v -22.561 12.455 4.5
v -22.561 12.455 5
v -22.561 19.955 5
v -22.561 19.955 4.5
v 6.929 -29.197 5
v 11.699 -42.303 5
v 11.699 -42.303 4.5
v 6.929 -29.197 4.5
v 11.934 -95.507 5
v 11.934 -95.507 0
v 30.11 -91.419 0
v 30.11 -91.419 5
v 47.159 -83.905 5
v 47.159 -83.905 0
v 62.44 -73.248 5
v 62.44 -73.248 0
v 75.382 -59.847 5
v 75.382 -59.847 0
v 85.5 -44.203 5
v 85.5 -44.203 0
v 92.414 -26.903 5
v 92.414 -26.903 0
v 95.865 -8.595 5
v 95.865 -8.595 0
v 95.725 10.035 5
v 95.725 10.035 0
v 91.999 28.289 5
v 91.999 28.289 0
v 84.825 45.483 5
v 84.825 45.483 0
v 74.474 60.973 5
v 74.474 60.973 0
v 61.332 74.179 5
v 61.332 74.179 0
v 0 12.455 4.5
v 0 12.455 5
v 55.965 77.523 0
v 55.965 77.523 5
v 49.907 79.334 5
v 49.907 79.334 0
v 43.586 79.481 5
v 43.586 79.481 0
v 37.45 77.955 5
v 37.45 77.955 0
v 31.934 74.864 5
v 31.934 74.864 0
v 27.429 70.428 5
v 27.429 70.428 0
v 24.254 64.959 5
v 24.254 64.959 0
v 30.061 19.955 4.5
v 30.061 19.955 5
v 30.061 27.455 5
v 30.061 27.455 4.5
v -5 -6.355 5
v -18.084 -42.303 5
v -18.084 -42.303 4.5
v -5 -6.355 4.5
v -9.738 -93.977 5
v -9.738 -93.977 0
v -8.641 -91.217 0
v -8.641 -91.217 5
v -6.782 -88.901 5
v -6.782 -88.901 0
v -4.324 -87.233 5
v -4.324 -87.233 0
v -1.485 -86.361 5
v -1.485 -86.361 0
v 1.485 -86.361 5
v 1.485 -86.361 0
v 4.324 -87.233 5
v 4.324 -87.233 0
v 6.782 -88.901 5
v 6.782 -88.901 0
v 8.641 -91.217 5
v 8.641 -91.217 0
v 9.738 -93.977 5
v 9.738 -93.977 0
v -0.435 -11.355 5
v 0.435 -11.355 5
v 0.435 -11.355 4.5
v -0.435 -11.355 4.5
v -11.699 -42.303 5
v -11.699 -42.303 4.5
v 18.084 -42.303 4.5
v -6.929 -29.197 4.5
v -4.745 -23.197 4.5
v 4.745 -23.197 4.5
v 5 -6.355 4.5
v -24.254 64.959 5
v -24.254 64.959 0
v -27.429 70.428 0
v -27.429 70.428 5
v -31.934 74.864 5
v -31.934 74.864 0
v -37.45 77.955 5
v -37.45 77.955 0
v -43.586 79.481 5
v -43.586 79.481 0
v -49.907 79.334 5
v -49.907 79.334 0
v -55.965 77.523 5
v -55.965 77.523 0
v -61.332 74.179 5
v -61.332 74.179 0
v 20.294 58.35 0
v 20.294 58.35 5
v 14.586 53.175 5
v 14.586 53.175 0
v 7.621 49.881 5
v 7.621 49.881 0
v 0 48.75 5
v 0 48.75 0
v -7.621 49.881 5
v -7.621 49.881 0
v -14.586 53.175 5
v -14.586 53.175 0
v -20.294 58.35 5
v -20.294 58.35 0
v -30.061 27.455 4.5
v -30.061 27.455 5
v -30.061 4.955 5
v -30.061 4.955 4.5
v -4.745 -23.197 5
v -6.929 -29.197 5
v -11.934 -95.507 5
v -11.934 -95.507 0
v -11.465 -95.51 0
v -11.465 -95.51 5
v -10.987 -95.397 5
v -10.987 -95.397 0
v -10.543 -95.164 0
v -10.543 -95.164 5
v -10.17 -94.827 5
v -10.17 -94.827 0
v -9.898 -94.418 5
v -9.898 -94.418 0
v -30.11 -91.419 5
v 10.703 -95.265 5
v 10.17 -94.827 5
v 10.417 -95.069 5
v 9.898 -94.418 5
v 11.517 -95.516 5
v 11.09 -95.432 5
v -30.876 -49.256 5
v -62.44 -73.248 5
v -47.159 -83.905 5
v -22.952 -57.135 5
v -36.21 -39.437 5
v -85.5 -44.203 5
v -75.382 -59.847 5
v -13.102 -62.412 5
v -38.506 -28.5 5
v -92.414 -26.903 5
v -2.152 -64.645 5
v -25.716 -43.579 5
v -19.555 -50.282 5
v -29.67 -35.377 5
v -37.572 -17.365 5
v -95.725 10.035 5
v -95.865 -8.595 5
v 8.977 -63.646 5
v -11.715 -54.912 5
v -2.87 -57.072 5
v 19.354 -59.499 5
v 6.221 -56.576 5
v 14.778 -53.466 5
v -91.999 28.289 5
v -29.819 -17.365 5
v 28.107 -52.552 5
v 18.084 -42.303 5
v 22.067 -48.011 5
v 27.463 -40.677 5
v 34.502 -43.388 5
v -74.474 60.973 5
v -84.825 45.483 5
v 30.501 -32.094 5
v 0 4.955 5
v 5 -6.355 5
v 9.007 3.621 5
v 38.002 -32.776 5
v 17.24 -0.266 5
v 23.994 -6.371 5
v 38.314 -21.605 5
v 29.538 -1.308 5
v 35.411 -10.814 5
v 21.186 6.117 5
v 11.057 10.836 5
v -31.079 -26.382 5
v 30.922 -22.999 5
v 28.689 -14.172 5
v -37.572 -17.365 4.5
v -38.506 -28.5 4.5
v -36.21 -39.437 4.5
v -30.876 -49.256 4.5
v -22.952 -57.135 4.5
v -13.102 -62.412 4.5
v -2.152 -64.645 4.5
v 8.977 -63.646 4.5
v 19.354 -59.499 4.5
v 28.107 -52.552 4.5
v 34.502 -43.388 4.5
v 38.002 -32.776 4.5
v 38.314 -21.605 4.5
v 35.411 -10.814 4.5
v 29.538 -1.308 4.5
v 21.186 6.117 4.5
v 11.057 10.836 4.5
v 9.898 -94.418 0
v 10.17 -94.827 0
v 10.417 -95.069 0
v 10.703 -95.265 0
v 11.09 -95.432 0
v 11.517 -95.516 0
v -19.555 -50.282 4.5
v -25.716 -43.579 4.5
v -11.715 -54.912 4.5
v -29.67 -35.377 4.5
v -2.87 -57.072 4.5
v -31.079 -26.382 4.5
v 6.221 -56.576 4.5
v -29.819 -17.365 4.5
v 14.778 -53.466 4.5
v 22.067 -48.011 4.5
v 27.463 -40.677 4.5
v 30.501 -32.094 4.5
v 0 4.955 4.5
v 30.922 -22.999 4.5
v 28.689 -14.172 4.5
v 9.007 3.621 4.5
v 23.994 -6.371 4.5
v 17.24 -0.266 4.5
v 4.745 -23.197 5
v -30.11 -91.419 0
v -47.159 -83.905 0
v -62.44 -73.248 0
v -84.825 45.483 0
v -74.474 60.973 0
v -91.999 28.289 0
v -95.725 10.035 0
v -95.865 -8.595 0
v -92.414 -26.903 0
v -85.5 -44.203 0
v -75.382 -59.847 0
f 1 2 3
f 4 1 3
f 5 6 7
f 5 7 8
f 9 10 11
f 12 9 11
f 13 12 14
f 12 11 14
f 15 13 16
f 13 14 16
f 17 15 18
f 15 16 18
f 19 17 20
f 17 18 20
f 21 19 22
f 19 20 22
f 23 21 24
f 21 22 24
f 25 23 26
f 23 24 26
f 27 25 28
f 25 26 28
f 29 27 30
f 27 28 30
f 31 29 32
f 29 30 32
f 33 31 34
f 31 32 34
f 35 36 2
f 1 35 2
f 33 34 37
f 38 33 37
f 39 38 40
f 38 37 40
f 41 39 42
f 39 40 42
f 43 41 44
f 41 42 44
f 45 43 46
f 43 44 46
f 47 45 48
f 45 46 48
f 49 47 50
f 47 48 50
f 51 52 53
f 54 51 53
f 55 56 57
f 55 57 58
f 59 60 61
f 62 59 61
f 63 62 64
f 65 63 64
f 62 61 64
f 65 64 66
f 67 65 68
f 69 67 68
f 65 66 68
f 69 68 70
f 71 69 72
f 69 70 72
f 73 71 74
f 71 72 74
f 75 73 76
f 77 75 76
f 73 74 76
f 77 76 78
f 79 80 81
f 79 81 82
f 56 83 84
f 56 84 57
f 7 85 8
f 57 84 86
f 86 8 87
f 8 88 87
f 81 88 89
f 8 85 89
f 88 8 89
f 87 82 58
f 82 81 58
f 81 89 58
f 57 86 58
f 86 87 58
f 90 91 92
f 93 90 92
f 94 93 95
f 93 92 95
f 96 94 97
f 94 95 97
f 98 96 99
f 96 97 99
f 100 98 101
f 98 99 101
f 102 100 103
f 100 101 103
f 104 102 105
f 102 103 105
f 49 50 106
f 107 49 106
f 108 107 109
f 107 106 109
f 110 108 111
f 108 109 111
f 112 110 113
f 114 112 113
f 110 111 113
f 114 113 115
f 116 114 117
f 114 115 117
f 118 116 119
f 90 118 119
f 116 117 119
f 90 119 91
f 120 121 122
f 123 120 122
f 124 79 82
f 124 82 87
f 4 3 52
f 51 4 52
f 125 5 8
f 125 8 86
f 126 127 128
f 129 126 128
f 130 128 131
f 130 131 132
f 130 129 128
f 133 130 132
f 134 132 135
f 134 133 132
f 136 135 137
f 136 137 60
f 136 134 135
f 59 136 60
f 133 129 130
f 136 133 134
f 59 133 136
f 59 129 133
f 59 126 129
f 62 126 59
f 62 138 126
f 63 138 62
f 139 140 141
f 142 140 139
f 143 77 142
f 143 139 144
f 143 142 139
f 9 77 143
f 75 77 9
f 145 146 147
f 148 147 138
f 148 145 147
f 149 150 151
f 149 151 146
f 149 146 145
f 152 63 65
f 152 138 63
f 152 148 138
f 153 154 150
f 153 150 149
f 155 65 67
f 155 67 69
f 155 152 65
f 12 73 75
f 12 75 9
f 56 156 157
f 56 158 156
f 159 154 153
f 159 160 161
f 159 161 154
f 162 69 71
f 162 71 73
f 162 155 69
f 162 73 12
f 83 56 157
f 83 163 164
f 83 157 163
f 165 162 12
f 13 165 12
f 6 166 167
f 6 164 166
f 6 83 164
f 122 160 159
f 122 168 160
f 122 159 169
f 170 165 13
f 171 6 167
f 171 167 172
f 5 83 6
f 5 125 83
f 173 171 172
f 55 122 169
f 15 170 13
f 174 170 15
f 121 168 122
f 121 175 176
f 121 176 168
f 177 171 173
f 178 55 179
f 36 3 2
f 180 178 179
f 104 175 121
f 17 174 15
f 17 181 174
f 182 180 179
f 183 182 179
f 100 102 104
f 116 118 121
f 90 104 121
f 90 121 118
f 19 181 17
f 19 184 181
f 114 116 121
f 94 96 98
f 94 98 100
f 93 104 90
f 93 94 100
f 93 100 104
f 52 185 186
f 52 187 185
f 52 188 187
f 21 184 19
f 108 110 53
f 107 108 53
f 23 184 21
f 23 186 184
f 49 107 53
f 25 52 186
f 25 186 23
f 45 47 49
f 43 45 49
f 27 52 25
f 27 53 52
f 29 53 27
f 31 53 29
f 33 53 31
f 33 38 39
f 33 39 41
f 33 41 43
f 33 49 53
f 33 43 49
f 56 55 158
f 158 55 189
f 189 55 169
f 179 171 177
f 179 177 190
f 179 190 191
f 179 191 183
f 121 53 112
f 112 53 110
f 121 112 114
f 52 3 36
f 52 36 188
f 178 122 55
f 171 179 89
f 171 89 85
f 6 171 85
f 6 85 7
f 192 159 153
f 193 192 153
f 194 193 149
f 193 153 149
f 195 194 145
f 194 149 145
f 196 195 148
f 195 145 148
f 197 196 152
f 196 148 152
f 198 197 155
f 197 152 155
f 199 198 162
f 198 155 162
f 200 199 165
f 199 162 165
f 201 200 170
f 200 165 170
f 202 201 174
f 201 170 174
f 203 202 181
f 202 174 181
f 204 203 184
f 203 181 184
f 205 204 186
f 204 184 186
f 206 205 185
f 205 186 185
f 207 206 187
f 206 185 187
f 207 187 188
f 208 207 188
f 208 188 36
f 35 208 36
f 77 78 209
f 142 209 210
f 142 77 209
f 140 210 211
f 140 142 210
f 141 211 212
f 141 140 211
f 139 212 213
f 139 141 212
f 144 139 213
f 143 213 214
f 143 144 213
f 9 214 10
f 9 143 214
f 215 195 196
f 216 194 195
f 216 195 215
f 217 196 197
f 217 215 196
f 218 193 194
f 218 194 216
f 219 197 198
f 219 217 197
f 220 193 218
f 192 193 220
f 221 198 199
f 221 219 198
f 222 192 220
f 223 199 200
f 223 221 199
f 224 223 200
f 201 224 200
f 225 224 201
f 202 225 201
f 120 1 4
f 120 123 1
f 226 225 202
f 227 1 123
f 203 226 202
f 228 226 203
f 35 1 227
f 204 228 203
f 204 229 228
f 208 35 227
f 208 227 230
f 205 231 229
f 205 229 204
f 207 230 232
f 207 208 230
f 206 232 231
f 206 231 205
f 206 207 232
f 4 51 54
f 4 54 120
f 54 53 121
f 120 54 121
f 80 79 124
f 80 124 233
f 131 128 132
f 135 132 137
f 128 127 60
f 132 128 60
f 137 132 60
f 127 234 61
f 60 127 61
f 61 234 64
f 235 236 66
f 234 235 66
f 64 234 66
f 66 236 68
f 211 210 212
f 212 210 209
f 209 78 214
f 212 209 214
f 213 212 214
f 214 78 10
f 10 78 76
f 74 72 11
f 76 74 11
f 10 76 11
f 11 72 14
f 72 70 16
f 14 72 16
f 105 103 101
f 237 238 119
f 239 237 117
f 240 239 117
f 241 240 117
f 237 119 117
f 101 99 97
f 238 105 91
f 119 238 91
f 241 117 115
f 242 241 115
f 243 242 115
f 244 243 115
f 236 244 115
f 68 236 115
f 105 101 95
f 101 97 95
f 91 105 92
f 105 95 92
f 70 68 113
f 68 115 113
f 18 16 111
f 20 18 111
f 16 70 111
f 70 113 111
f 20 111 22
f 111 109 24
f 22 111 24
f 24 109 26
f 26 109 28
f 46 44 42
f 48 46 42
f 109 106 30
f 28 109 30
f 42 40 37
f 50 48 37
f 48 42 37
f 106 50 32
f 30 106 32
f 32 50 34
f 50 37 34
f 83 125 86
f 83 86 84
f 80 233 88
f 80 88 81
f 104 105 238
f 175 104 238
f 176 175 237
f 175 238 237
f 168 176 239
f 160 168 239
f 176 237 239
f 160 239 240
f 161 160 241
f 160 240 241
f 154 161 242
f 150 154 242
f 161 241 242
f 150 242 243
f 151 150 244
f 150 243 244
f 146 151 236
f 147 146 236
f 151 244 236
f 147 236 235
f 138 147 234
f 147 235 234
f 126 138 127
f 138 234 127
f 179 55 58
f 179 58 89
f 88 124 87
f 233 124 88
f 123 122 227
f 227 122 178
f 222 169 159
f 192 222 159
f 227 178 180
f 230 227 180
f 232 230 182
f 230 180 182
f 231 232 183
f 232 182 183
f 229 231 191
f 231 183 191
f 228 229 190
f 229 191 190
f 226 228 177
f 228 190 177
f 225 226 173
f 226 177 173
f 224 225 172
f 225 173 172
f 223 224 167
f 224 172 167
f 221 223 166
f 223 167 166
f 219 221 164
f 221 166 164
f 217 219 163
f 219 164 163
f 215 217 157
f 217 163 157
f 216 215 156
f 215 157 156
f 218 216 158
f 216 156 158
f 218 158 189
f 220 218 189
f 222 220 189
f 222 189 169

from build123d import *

# Parameters (mm, degrees)
SALIENTE_EXTRUIR1_DEPTH = 5
CORTAR_EXTRUIR1_DEPTH   = 0.5
REDONDEO1_R             = 2
REDONDEO2_R             = 2


with BuildPart() as part:
    # Croquis2 → Saliente-Extruir1 (new body)
    with BuildSketch(Plane.XY):
        with BuildLine():
            ThreePointArc((-61.331528305, 74.17887931), (-92.135043085, -27.842347885), (-9.986497884, -95.730519481))
            ThreePointArc((-9.986497884, -95.730519481), (0, -86.25), (9.986497884, -95.730519481))
            ThreePointArc((9.986497884, -95.730519481), (92.135043085, -27.842347885), (61.331528305, 74.17887931))
            ThreePointArc((61.331528305, 74.17887931), (40.466763827, 78.9231673), (24.253831648, 64.959375))
            ThreePointArc((24.253831648, 64.959375), (0, 48.75), (-24.253831648, 64.959375))
            ThreePointArc((-24.253831648, 64.959375), (-40.466763827, 78.9231673), (-61.331528305, 74.17887931))
        make_face()
    extrude(amount=SALIENTE_EXTRUIR1_DEPTH)

    # Croquis3 → Cortar-Extruir1 (cut)
    # profile 1 of 2: a face of its own
    with BuildSketch(Plane.XY.offset(5)):
        with BuildLine():
            Line((30.060560178, 27.454508154), (-30.060560178, 27.454508154))
            Line((-30.060560178, 27.454508154), (-30.060560178, 4.954508154))
            Line((-30.060560178, 4.954508154), (0, 4.954508154))
            ThreePointArc((0, 4.954508154), (18.623585271, -51.006906249), (-29.81944868, -17.364815175))
            Line((-29.81944868, -17.364815175), (-37.571846699, -17.364815175))
            ThreePointArc((-37.571846699, -17.364815175), (23.983513651, -56.343925991), (0, 12.454508154))
            Line((0, 12.454508154), (-22.560560178, 12.454508154))
            Line((-22.560560178, 12.454508154), (-22.560560178, 19.954508154))
            Line((-22.560560178, 19.954508154), (30.060560178, 19.954508154))
            Line((30.060560178, 19.954508154), (30.060560178, 27.454508154))
        make_face()
    # profile 2 of 2: a face of its own
    with BuildSketch(Plane.XY.offset(5)):
        Polygon((-5, -6.355312768), (5, -6.355312768), (18.083784961, -42.302716508), (11.698718326, -42.302716508), (6.928526472, -29.196722105), (-6.928526472, -29.196722105), (-11.698718326, -42.302716508), (-18.083784961, -42.302716508), align=None)
        Polygon((-4.744705067, -23.196722105), (4.744705067, -23.196722105), (0.434784536, -11.355312768), (-0.434784536, -11.355312768), align=None, mode=Mode.SUBTRACT)
    extrude(amount=-CORTAR_EXTRUIR1_DEPTH, mode=Mode.SUBTRACT)

    # Redondeo1
    redondeo1_edges = [part.edges().sort_by_distance(p)[0] for p in [
        (-9.986497884, -95.730519481, 2.5),
    ]]
    fillet(redondeo1_edges, radius=REDONDEO1_R)

    # Redondeo2
    redondeo2_edges = [part.edges().sort_by_distance(p)[0] for p in [
        (9.986497884, -95.730519481, 2.5),
    ]]
    fillet(redondeo2_edges, radius=REDONDEO2_R)


solid = part.part
